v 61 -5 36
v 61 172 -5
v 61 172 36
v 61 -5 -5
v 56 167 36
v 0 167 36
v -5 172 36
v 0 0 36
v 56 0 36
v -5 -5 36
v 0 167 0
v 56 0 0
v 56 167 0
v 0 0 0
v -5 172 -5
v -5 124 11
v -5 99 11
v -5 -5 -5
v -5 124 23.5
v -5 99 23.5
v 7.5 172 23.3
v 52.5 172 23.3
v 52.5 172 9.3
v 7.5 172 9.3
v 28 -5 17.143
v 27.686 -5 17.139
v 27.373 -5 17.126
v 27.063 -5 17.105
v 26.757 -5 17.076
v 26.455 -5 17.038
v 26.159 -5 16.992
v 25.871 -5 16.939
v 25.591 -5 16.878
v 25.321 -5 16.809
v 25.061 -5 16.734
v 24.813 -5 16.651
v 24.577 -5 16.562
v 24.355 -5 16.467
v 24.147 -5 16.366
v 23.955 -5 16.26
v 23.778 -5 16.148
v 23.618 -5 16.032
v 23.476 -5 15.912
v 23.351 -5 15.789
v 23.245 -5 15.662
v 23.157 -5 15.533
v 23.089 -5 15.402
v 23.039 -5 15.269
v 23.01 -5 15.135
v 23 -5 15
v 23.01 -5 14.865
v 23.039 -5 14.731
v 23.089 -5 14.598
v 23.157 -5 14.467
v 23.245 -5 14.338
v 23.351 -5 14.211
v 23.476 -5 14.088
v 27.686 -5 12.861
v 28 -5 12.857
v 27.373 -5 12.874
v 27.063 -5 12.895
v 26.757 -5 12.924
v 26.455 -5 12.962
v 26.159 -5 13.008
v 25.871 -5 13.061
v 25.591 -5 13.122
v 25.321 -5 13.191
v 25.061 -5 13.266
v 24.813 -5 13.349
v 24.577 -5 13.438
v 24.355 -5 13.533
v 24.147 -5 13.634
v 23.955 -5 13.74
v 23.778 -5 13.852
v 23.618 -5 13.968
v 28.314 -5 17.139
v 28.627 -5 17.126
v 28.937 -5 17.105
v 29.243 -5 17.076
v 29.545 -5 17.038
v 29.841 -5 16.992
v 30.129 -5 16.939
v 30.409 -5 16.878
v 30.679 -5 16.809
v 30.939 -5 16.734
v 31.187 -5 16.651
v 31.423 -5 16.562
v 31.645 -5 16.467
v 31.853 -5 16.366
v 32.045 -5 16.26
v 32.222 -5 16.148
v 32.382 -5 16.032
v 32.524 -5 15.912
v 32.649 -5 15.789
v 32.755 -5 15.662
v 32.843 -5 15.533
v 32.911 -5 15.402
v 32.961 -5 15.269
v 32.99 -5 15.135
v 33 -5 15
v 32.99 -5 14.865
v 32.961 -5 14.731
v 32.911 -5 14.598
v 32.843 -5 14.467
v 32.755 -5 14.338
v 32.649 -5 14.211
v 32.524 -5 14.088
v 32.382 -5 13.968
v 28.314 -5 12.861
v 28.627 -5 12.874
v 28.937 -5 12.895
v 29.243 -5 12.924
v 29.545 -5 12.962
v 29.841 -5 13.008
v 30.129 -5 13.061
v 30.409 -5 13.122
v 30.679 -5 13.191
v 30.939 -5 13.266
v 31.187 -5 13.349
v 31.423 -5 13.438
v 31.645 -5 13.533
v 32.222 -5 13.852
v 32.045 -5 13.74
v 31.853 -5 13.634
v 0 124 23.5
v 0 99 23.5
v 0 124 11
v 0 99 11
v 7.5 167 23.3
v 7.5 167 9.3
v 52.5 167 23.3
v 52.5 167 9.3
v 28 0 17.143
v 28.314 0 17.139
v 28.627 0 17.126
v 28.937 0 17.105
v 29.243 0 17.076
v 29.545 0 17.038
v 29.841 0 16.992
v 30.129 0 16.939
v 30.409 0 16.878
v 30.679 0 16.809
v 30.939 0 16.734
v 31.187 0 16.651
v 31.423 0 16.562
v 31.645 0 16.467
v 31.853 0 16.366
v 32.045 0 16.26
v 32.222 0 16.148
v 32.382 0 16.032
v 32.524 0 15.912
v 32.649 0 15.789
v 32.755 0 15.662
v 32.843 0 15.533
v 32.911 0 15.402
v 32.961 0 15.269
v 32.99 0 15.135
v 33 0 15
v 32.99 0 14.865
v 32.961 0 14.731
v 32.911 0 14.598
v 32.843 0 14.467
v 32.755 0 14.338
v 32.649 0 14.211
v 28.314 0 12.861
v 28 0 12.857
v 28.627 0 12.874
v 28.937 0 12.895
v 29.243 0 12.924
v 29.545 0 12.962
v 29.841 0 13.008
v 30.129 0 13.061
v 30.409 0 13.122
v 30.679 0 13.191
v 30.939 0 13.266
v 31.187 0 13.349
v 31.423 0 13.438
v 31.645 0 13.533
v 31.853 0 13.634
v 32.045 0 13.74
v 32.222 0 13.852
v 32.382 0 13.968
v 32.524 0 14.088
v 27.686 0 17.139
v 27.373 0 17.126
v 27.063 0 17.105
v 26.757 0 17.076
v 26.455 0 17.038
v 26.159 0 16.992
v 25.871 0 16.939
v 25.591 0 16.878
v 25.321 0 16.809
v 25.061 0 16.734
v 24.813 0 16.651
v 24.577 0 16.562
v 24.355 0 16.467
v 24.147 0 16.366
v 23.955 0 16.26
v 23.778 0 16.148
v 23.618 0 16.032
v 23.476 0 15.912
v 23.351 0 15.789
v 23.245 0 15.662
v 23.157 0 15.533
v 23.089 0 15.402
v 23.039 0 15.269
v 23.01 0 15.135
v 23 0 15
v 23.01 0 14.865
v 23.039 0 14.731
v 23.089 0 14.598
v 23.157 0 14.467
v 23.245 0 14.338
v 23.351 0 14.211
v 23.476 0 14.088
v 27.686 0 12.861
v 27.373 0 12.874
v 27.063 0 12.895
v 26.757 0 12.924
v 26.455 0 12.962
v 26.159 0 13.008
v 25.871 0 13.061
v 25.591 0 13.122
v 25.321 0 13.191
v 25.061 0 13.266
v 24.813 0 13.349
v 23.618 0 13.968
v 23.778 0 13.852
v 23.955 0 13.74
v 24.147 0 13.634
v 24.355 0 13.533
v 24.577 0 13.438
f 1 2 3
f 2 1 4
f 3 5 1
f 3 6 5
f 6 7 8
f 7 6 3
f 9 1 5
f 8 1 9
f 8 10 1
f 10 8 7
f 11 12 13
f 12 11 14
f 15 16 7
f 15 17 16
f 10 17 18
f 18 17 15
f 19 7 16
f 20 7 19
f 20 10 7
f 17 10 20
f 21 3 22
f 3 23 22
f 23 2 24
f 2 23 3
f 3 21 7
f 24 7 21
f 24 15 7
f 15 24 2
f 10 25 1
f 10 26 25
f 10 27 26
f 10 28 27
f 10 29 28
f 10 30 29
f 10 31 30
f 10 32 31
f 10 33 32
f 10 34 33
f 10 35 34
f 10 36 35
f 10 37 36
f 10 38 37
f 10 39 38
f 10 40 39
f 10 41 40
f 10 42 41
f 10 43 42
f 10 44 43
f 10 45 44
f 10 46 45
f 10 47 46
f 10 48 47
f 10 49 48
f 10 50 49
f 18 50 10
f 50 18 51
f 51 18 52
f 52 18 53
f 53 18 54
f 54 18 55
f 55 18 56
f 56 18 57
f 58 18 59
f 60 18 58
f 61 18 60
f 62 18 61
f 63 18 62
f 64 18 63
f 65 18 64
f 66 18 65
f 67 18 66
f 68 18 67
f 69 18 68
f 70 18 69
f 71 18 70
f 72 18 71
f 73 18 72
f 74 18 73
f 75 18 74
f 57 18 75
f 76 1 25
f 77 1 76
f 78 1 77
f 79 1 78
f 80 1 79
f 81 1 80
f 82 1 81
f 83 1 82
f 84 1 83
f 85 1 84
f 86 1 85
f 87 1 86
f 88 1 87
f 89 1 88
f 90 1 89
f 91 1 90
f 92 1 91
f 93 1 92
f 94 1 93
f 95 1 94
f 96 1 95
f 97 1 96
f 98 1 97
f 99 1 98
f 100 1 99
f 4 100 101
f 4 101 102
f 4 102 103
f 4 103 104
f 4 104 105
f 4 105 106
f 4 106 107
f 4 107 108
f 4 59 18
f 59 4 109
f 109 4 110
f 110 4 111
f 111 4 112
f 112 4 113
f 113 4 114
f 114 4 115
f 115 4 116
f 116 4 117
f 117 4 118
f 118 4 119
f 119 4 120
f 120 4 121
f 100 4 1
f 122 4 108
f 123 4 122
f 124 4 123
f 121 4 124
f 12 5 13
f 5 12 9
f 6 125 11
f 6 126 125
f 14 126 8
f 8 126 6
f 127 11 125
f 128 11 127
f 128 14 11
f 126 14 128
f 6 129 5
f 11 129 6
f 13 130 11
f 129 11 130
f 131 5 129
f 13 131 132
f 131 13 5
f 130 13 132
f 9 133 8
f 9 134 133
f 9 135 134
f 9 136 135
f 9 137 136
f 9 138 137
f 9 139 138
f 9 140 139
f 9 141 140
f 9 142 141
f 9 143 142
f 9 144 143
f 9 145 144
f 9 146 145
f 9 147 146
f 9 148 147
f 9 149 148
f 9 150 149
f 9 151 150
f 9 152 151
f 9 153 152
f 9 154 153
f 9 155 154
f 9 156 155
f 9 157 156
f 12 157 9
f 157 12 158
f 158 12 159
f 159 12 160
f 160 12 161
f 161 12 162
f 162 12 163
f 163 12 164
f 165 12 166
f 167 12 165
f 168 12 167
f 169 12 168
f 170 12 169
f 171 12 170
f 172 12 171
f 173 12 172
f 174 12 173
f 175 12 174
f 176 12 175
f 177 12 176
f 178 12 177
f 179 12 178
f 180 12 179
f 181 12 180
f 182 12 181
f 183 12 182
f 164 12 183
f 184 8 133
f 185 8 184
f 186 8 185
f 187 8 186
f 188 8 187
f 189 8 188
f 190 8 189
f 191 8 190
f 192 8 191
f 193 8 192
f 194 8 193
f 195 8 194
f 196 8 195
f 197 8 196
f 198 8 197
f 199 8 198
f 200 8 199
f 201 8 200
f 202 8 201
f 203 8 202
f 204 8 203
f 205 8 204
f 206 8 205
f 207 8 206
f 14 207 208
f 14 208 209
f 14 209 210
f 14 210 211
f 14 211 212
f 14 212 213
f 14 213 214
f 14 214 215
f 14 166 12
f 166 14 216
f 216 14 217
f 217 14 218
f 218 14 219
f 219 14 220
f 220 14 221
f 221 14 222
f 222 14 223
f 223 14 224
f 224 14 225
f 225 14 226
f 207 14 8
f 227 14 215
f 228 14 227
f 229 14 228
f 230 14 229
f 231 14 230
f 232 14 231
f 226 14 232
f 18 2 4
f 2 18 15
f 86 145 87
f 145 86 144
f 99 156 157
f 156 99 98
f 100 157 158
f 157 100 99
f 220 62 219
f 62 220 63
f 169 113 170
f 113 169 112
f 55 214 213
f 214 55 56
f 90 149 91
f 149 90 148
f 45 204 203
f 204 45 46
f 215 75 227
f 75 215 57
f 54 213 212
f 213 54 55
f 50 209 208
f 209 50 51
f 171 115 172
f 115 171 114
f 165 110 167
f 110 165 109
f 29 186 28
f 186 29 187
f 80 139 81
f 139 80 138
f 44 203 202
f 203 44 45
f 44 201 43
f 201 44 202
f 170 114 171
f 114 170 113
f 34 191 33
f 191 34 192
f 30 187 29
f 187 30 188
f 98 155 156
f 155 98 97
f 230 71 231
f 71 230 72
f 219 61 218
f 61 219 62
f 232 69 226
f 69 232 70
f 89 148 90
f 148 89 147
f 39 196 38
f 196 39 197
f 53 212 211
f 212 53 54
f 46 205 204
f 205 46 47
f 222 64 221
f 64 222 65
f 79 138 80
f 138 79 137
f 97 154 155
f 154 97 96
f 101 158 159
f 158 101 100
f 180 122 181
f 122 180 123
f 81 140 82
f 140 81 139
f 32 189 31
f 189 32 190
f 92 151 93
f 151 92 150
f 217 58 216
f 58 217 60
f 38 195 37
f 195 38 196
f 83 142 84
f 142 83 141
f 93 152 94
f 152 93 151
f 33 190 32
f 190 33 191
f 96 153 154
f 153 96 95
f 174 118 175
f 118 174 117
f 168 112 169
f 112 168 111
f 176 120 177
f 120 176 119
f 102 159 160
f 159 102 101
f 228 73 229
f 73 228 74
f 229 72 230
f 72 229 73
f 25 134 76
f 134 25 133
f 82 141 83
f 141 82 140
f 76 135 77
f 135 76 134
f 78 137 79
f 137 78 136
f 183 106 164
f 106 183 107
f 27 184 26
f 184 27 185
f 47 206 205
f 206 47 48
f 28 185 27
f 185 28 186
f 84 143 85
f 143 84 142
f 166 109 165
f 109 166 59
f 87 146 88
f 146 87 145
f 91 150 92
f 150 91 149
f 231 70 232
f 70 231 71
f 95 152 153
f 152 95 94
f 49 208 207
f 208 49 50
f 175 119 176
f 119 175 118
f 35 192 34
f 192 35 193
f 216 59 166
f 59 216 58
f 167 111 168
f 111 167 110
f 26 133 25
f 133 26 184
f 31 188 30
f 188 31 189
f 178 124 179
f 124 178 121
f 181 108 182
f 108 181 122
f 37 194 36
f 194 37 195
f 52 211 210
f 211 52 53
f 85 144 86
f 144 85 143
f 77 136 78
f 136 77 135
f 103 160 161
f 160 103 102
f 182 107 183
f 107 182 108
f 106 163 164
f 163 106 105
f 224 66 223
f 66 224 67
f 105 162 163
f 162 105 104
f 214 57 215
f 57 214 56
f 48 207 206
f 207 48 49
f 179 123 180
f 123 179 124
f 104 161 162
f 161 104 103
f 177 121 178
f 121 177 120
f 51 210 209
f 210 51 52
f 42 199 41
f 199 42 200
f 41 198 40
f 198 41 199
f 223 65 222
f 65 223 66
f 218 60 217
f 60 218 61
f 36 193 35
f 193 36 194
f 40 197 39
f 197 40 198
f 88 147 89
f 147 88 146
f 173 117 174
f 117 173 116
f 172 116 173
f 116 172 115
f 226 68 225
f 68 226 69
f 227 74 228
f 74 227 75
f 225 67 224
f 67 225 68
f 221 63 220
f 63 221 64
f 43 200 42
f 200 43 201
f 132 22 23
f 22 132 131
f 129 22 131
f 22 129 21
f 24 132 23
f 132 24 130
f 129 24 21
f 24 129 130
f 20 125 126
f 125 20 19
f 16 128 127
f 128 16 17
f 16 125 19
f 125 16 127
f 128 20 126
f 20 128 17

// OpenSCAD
// Variables for breadboard dimensions
bb_width = 56;      // Width in mm
bb_length = 167;    // Length in mm (+1 mm for power supply overhang)
wall_thickness = 5; // Wall thickness in mm
wall_height = 36;   // Height of walls above XY plane in mm

// Create the basic box without any holes
module basic_breadboard_box() {
    // Solid base plate at the XY plane
    translate([-wall_thickness, -wall_thickness, -wall_thickness])
        cube([bb_width + 2*wall_thickness, 
              bb_length + 2*wall_thickness, 
              wall_thickness]);
    
    // Walls extending above the XY plane
    difference() {
        // Outer walls
        translate([-wall_thickness, -wall_thickness, 0])
            cube([bb_width + 2*wall_thickness, 
                  bb_length + 2*wall_thickness, 
                  wall_height]);
        
        // Inner cutout for breadboard
        translate([0, 0, 0])
            cube([bb_width, bb_length, wall_height + 1]);
    }
}

// Create a USB-C hole (elliptical)
module usb_c_hole() {
    // Move to the width-side wall at 17mm above XY plane
    translate([bb_width/2, -wall_thickness/2, 15])
        rotate([90, 0, 0])  // Rotate to face the width side
            scale([1, 3/7, 1])  // Scale to create ellipse (14x6mm)
                cylinder(h=wall_thickness*2, r=5, center=true, $fn=100);
}

module power_supply_hole() {
    ps_hole_height = 14;
    ps_hole_width = 45;
    translate([bb_width/2 + 2, wall_thickness/2 + bb_length, 9.3 + ps_hole_height/2])
        cube([45, wall_thickness+0.01, ps_hole_height], center=true);
}

module rtd_hole() {
    rtd_hole_height = 12.5;
    rtd_hole_width = 25;
    rtd_hole_y_offset = 99;
    rtd_hole_base_height = 11;
    
    translate([-wall_thickness / 2, rtd_hole_y_offset + rtd_hole_width / 2, rtd_hole_base_height + rtd_hole_height / 2])
    cube([wall_thickness + 0.01, rtd_hole_width, rtd_hole_height], center=true);
    
}


// Final box with holes
module final_breadboard_box() {
    difference() {
        basic_breadboard_box();
        usb_c_hole();
        power_supply_hole();
        rtd_hole();
    }
    
    
}

// Call the module to render the final box
final_breadboard_box();

// color("red") rtd_hole();
